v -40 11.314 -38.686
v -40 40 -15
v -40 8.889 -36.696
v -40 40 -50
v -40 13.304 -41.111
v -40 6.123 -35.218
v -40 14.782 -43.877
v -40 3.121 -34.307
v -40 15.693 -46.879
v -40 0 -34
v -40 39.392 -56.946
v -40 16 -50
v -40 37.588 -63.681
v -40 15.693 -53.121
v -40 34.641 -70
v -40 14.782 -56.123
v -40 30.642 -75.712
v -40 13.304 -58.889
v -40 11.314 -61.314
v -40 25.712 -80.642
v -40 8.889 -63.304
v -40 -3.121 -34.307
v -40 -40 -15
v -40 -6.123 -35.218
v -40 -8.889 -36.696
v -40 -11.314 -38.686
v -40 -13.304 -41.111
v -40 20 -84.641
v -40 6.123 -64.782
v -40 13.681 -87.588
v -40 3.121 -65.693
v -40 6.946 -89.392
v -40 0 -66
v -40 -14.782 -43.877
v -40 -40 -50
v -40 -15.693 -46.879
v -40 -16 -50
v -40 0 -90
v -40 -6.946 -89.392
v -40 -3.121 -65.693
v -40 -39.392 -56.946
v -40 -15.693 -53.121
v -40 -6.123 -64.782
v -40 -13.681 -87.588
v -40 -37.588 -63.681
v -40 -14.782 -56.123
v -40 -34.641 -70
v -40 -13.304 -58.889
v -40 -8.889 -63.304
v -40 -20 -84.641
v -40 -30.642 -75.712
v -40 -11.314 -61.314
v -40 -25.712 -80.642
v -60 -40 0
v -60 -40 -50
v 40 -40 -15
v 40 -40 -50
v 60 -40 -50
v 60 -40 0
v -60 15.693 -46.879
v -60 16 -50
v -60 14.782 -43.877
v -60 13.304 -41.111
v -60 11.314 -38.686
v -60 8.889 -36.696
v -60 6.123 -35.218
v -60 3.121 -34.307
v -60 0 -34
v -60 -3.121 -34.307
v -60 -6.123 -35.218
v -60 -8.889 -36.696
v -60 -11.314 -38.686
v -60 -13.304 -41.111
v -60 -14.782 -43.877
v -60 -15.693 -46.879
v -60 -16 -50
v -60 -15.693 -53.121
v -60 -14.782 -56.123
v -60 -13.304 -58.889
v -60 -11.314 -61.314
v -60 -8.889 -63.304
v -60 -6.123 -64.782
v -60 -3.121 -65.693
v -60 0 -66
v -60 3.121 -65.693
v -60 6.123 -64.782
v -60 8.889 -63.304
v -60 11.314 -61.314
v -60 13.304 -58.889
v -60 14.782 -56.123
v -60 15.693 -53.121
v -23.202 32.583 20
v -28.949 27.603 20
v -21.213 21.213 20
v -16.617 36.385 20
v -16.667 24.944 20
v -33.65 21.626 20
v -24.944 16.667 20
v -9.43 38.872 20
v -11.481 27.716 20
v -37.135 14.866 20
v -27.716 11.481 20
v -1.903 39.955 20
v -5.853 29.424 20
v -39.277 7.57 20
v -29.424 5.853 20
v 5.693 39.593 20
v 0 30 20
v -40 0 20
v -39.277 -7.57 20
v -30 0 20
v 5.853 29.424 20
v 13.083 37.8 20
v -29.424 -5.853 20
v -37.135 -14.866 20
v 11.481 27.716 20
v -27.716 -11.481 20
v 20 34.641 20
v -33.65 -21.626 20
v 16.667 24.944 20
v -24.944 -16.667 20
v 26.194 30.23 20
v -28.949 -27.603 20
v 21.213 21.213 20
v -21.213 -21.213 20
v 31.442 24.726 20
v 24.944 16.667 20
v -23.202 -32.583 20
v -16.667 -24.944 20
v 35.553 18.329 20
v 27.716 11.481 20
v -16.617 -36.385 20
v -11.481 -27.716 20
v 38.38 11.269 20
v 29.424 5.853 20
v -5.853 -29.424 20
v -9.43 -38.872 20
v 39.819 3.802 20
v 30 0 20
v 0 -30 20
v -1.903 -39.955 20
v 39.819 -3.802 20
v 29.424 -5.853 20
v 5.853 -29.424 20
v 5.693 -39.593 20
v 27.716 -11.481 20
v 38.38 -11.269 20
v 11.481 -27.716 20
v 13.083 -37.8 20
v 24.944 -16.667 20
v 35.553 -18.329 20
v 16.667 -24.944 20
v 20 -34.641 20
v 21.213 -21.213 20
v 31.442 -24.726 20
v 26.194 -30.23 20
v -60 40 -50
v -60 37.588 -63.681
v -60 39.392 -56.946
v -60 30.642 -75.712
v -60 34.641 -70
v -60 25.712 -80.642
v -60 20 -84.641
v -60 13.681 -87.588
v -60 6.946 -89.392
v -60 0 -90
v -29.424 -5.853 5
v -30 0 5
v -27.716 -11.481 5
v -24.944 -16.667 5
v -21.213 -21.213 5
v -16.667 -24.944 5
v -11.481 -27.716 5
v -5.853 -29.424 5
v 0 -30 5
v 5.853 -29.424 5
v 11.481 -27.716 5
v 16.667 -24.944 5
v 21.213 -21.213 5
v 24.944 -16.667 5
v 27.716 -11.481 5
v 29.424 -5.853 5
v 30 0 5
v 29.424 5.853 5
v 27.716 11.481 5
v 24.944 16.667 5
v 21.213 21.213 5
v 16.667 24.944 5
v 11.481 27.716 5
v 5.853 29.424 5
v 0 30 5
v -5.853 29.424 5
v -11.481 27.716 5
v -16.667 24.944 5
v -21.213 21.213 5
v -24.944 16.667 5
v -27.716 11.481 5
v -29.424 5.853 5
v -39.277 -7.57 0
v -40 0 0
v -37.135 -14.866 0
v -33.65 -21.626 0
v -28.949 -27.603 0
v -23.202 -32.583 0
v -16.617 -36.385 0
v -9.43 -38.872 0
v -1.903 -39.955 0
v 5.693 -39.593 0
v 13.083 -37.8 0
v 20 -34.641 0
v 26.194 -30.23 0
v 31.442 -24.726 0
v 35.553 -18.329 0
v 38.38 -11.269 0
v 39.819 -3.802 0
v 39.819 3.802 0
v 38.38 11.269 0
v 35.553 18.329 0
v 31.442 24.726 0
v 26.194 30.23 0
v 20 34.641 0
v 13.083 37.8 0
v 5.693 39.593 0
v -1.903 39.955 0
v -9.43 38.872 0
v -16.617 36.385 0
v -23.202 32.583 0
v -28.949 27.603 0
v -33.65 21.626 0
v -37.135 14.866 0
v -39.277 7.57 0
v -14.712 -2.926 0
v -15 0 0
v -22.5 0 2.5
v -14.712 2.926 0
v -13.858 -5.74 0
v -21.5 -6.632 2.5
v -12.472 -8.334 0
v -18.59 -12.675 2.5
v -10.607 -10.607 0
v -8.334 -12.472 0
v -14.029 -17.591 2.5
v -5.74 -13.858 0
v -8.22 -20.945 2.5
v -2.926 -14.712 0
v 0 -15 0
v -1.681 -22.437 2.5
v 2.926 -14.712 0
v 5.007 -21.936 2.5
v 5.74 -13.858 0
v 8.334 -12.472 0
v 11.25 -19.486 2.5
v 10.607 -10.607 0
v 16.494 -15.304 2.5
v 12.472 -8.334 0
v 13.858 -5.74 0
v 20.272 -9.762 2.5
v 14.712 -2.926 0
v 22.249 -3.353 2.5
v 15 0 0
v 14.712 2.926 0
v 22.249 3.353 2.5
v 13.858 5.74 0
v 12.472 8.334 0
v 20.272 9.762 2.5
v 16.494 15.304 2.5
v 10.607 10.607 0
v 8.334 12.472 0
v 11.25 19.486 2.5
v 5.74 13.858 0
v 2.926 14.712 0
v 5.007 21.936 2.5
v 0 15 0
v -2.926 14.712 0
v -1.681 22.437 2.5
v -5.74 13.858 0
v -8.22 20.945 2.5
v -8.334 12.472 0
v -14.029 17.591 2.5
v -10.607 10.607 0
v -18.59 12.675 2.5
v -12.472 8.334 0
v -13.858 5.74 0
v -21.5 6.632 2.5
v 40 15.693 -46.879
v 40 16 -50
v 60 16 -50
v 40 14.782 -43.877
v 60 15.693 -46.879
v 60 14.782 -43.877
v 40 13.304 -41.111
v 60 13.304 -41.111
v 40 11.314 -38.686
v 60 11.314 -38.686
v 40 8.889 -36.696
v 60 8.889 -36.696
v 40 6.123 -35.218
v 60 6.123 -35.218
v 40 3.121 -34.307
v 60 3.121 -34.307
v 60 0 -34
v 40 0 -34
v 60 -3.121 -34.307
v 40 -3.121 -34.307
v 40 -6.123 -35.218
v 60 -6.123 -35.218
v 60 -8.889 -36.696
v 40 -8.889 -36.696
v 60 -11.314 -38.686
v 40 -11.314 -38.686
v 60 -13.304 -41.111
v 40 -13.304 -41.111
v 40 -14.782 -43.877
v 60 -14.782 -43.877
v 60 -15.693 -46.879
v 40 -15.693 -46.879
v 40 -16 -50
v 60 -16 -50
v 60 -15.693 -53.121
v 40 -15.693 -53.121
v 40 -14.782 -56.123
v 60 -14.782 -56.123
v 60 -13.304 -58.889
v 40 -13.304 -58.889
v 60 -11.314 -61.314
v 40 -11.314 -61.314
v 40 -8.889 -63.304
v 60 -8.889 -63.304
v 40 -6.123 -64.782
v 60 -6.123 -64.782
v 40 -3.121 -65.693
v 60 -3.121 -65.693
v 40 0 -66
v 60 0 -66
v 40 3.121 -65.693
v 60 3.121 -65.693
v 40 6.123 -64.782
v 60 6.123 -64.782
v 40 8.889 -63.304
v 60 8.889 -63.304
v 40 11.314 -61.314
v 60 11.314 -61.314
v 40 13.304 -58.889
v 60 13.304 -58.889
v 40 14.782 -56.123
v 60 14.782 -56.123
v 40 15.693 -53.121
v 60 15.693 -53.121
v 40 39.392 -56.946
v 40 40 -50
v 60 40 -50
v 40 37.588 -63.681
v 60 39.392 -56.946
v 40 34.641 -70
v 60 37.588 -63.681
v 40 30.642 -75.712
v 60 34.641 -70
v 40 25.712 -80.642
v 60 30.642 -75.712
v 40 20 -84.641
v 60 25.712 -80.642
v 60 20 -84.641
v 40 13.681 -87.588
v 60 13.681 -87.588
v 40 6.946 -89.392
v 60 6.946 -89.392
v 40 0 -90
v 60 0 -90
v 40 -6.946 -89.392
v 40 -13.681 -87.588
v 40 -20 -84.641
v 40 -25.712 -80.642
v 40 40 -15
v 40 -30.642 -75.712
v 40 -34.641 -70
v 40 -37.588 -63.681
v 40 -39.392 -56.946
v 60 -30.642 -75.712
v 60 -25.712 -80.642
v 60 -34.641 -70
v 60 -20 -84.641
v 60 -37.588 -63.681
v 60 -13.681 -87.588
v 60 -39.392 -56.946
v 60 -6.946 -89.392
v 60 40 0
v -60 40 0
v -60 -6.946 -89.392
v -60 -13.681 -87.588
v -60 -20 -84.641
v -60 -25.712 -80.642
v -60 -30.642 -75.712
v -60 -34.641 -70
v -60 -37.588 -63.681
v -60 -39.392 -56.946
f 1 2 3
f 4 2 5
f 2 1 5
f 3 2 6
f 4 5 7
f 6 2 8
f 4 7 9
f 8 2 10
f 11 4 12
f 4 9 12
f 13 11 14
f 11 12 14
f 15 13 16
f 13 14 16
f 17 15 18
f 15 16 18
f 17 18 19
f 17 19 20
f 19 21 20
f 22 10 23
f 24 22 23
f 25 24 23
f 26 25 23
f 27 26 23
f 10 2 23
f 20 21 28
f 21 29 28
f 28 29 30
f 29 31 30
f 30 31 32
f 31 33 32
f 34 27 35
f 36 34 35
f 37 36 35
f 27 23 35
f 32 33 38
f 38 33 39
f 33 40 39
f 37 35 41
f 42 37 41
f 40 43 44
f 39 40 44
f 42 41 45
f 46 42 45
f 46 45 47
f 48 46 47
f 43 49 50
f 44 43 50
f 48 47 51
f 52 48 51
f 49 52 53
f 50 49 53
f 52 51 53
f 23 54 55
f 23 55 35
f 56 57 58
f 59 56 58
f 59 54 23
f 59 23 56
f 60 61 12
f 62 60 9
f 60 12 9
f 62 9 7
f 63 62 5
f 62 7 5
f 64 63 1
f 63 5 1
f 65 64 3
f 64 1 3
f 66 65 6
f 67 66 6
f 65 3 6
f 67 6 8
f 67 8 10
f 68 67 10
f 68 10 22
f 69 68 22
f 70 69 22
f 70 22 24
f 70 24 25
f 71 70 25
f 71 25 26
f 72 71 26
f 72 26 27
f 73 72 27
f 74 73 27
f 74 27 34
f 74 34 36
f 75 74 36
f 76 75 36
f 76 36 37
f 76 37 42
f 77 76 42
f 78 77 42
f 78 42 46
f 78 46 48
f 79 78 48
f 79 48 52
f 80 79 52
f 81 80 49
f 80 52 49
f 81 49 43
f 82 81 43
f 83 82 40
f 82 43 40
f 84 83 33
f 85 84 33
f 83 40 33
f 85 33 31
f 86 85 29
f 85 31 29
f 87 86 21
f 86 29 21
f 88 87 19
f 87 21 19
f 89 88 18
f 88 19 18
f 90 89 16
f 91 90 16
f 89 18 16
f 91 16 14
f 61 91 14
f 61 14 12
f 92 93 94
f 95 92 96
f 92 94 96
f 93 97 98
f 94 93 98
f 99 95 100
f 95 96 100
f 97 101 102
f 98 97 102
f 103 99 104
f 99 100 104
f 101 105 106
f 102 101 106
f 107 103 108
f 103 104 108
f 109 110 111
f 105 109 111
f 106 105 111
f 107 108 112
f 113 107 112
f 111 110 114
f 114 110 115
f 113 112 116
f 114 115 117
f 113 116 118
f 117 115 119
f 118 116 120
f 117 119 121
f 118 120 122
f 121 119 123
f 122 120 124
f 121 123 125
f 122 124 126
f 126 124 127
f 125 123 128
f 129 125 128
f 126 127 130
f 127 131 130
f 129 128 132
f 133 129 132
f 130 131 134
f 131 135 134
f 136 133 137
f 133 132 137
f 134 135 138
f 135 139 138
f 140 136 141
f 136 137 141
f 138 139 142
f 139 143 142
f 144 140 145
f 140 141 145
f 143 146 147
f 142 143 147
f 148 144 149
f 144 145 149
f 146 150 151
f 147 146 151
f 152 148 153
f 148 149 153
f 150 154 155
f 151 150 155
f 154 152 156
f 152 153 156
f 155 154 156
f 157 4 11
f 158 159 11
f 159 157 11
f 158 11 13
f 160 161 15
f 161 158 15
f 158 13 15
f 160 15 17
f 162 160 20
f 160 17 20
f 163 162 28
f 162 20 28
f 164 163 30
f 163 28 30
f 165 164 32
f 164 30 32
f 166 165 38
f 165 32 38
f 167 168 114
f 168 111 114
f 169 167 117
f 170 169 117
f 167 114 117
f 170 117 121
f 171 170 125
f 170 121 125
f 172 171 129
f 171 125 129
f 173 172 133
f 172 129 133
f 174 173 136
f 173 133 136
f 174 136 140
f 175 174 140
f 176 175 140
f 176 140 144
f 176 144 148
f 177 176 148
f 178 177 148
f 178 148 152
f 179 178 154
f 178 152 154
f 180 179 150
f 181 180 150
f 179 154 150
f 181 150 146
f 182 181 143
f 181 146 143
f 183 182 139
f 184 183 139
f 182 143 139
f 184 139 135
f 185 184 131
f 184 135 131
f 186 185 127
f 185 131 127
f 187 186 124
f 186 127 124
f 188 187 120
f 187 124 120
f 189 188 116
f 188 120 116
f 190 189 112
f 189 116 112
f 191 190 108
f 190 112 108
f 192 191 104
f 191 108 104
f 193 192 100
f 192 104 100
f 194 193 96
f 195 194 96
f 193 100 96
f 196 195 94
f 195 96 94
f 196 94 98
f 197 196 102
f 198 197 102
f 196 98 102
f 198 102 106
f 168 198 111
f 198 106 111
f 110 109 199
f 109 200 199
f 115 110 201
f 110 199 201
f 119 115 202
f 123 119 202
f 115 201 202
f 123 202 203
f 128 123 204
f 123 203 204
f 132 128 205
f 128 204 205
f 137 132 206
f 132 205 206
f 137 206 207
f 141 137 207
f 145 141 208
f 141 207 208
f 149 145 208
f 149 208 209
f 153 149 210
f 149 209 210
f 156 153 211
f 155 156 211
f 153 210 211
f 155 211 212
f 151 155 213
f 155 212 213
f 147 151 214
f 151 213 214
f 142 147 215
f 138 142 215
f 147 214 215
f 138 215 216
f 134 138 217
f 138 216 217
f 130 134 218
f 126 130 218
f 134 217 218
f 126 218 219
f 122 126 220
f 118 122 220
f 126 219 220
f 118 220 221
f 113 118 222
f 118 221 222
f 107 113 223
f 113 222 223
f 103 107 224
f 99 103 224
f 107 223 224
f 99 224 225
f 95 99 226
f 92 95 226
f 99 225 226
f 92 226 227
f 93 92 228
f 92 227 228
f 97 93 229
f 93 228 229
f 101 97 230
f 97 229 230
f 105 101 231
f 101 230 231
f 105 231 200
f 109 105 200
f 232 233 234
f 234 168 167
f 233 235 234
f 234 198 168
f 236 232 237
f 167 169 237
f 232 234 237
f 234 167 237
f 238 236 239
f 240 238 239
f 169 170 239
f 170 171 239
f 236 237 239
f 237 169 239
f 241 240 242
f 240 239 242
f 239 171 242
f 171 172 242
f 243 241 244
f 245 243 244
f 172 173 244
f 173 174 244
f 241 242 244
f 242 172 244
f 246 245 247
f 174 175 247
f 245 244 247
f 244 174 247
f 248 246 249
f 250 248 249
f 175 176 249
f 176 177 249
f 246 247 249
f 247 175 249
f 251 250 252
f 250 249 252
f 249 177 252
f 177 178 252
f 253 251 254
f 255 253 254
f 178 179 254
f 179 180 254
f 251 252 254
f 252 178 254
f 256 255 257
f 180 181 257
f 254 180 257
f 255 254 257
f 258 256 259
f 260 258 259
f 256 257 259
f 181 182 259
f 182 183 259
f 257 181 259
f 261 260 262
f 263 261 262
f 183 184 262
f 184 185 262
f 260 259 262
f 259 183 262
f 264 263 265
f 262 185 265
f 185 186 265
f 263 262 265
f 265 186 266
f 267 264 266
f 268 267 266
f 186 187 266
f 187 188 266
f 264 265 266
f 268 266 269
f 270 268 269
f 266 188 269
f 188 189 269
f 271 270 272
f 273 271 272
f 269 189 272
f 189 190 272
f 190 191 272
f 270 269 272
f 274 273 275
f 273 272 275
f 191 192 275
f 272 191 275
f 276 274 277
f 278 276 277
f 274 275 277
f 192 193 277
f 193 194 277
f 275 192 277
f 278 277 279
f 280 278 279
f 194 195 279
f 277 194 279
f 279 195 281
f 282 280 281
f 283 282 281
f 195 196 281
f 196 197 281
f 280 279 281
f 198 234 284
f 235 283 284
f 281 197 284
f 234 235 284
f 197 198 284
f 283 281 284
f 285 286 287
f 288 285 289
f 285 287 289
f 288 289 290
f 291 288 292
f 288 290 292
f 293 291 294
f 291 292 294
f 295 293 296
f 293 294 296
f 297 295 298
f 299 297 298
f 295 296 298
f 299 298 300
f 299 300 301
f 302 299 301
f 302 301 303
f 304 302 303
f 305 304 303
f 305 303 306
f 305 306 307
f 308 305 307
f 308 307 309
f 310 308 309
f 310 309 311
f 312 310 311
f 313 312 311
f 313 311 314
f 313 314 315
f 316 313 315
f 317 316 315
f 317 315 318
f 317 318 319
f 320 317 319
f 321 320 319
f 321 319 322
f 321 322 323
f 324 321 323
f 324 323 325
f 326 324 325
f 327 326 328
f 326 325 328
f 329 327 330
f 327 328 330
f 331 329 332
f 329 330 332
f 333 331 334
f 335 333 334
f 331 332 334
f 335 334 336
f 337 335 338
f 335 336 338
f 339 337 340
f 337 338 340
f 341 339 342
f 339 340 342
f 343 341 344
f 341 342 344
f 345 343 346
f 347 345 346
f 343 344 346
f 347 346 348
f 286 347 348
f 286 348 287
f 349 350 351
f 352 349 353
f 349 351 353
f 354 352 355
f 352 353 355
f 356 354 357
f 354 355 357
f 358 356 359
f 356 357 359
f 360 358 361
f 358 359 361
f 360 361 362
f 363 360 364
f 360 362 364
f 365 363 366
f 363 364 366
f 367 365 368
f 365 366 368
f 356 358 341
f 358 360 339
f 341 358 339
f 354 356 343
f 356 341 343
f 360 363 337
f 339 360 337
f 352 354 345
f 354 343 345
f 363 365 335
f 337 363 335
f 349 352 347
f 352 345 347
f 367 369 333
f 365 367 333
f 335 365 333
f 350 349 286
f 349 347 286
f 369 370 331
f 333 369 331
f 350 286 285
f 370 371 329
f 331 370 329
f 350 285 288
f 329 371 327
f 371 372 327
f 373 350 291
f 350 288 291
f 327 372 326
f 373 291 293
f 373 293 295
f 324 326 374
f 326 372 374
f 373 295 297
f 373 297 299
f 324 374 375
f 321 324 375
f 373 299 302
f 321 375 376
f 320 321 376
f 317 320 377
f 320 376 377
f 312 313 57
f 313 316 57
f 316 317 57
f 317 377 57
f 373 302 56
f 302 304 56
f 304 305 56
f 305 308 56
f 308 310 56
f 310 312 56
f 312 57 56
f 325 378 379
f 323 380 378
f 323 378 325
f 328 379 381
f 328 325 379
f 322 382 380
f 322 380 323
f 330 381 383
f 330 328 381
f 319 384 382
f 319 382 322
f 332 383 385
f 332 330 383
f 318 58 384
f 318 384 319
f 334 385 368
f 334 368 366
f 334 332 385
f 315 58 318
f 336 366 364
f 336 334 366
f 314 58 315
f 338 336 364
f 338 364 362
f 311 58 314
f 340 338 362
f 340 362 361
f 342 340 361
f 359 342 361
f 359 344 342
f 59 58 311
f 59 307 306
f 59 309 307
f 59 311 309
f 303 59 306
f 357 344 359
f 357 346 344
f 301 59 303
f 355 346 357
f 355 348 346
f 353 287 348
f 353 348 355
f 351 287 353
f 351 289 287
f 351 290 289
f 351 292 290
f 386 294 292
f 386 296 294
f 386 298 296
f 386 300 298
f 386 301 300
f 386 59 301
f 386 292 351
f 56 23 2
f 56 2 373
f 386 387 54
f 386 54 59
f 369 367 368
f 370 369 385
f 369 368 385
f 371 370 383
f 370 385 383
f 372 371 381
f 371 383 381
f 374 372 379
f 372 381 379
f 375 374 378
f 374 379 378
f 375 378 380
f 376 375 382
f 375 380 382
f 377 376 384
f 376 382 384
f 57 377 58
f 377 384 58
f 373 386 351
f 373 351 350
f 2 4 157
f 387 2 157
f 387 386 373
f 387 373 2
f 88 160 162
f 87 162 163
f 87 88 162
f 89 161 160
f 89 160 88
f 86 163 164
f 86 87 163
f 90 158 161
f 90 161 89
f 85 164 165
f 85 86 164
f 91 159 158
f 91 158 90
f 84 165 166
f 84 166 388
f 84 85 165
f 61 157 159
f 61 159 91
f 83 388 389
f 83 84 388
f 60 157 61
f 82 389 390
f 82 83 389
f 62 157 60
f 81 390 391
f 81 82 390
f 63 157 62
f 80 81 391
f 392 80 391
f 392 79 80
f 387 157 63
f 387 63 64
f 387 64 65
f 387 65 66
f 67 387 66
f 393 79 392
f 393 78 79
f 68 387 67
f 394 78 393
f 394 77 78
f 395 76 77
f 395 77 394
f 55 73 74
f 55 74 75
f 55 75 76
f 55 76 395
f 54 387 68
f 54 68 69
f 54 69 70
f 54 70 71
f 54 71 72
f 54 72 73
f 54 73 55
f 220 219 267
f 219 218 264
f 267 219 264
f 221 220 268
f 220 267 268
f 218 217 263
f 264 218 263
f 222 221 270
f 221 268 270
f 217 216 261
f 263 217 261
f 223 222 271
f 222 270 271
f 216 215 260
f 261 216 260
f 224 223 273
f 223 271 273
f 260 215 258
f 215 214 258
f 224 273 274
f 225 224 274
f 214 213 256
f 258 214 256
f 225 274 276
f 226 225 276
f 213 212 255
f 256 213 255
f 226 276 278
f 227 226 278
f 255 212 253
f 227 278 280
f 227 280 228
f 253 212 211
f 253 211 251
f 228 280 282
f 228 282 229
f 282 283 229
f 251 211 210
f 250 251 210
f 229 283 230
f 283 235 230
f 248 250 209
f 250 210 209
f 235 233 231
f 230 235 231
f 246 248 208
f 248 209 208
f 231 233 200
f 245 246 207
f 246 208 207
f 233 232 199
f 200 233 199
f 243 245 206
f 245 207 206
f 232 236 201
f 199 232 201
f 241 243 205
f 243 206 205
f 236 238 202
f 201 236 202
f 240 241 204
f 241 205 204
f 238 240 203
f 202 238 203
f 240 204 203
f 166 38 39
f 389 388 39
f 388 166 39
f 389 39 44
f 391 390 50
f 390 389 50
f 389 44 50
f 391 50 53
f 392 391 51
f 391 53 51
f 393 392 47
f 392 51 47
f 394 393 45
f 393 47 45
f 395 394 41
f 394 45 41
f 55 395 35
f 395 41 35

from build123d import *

# Parameters (mm, degrees)
F0_R     = 30
F0_R_2   = 15
F1_DEPTH = 90
F2_R     = 16
F3_DEPTH = 250
F4_DEPTH = 250
F5_DEPTH = 250
F6_W     = 80
F6_H     = 40
F6_H_2   = 35
F7_DEPTH = 250
F8_DEPTH = 25


# Not quite as in the source:
# - a feature names something its author has since deleted; it is built from what else it names


with BuildPart() as f1:
    # F0 (on Top) → F1 (new body)
    with BuildSketch(Plane.XY):
        with BuildLine():
            Line((0, -40), (60, -40))
            Line((60, -40), (60, 40))
            Line((60, 40), (0, 40))
            ThreePointArc((0, 40), (28.2842712475, 28.2842712475), (40, 0))
            ThreePointArc((40, 0), (28.2842712475, -28.2842712475), (0, -40))
        make_face()
        with BuildLine():
            Line((-60, -40), (0, -40))
            ThreePointArc((0, -40), (-40, 0), (0, 40))
            Line((0, 40), (-60, 40))
            Line((-60, 40), (-60, -40))
        make_face()
        with BuildLine():
            ThreePointArc((0, 40), (-40, 0), (0, -40))
            ThreePointArc((0, -40), (28.2842712475, -28.2842712475), (40, 0))
            ThreePointArc((40, 0), (28.2842712475, 28.2842712475), (0, 40))
        make_face()
        Circle(F0_R, mode=Mode.SUBTRACT)
        Circle(F0_R)
        Circle(F0_R_2, mode=Mode.SUBTRACT)
        Circle(F0_R_2)
    extrude(amount=-F1_DEPTH)

    # F2 (on face) → F3 (cut)
    with BuildSketch(Plane.YZ.offset(60)):
        with BuildLine():
            ThreePointArc((0, -90), (-28.2842712475, -78.2842712475), (-40, -50))
            Line((-40, -50), (-40, -90))
            Line((-40, -90), (0, -90))
        make_face()
        with BuildLine():
            Line((40, -90), (40, -50))
            ThreePointArc((40, -50), (28.2842712475, -78.2842712475), (0, -90))
            Line((0, -90), (40, -90))
        make_face()
        with Locations((0, -50)):
            Circle(F2_R)
    extrude(amount=-F3_DEPTH, mode=Mode.SUBTRACT)

    # F2 (on face) → F4 (cut)
    with BuildSketch(Plane.YZ.offset(60)):
        with Locations((0, -50)):
            Circle(F2_R)
    extrude(amount=-F4_DEPTH, mode=Mode.SUBTRACT)

    # F2 (on face) → F5 (cut)
    with BuildSketch(Plane.YZ.offset(60)):
        with Locations((0, -50)):
            Circle(F2_R)
    extrude(amount=-F5_DEPTH, mode=Mode.SUBTRACT)

    # F6 (on face) → F7 (cut)
    with BuildSketch(Plane.XZ.offset(40)):
        with Locations((0, -70)):
            Rectangle(F6_W, F6_H)
        with Locations((0, -32.5)):
            Rectangle(F6_W, F6_H_2)
    extrude(amount=-F7_DEPTH, mode=Mode.SUBTRACT)

    # F2 (on face) → F8 (cut)
    with BuildSketch(Plane.YZ.offset(60)):
        with BuildLine():
            ThreePointArc((0, -90), (-28.2842712475, -78.2842712475), (-40, -50))
            Line((-40, -50), (-40, -90))
            Line((-40, -90), (0, -90))
        make_face()
    extrude(amount=-F8_DEPTH, mode=Mode.SUBTRACT)


with BuildPart() as f10:
    # F9 (on Front) → F10 (revolve)
    with BuildSketch(Plane.XZ):
        Polygon((-40, 20), (-40, 0), (-15, 0), (-30, 5), (-30, 20), align=None)
    revolve(axis=Axis((0, 0, 21.7640828341), (0, 0, 1)))


solid = Compound([f1.part, f10.part])
